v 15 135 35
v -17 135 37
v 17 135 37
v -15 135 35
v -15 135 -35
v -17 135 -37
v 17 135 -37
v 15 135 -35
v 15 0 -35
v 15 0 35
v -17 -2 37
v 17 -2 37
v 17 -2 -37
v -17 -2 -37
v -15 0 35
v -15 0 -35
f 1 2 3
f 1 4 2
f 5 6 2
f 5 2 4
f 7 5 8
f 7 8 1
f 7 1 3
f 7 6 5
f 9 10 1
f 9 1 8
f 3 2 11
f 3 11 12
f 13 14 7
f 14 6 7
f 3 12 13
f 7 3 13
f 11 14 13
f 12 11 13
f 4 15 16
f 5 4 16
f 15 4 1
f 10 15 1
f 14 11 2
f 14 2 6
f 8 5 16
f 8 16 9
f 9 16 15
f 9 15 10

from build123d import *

# Parameters (mm, degrees)
ESQUISSE1_W        = 34
ESQUISSE1_H        = 74
ESQUISSE1_W_2      = 30
ESQUISSE1_H_2      = 70
BOSS_EXTRU_1_DEPTH = 135
ESQUISSE1_2_W      = 34
ESQUISSE1_2_H      = 74
BOSS_EXTRU_2_DEPTH = 2


with BuildPart() as part:
    # Esquisse1 → Boss.-Extru.1 (new body)
    with BuildSketch(Plane(origin=(0, 0, 0), x_dir=(1, 0, 0), z_dir=(0, 1, 0))):
        Rectangle(ESQUISSE1_W, ESQUISSE1_H)
        Rectangle(ESQUISSE1_W_2, ESQUISSE1_H_2, mode=Mode.SUBTRACT)
    extrude(amount=BOSS_EXTRU_1_DEPTH)

    # Esquisse1<2> → Boss.-Extru.2 (add)
    with BuildSketch(Plane(origin=(0, 0, 0), x_dir=(1, 0, 0), z_dir=(0, 1, 0))):
        Rectangle(ESQUISSE1_2_W, ESQUISSE1_2_H)
    extrude(amount=-BOSS_EXTRU_2_DEPTH)


solid = part.part
